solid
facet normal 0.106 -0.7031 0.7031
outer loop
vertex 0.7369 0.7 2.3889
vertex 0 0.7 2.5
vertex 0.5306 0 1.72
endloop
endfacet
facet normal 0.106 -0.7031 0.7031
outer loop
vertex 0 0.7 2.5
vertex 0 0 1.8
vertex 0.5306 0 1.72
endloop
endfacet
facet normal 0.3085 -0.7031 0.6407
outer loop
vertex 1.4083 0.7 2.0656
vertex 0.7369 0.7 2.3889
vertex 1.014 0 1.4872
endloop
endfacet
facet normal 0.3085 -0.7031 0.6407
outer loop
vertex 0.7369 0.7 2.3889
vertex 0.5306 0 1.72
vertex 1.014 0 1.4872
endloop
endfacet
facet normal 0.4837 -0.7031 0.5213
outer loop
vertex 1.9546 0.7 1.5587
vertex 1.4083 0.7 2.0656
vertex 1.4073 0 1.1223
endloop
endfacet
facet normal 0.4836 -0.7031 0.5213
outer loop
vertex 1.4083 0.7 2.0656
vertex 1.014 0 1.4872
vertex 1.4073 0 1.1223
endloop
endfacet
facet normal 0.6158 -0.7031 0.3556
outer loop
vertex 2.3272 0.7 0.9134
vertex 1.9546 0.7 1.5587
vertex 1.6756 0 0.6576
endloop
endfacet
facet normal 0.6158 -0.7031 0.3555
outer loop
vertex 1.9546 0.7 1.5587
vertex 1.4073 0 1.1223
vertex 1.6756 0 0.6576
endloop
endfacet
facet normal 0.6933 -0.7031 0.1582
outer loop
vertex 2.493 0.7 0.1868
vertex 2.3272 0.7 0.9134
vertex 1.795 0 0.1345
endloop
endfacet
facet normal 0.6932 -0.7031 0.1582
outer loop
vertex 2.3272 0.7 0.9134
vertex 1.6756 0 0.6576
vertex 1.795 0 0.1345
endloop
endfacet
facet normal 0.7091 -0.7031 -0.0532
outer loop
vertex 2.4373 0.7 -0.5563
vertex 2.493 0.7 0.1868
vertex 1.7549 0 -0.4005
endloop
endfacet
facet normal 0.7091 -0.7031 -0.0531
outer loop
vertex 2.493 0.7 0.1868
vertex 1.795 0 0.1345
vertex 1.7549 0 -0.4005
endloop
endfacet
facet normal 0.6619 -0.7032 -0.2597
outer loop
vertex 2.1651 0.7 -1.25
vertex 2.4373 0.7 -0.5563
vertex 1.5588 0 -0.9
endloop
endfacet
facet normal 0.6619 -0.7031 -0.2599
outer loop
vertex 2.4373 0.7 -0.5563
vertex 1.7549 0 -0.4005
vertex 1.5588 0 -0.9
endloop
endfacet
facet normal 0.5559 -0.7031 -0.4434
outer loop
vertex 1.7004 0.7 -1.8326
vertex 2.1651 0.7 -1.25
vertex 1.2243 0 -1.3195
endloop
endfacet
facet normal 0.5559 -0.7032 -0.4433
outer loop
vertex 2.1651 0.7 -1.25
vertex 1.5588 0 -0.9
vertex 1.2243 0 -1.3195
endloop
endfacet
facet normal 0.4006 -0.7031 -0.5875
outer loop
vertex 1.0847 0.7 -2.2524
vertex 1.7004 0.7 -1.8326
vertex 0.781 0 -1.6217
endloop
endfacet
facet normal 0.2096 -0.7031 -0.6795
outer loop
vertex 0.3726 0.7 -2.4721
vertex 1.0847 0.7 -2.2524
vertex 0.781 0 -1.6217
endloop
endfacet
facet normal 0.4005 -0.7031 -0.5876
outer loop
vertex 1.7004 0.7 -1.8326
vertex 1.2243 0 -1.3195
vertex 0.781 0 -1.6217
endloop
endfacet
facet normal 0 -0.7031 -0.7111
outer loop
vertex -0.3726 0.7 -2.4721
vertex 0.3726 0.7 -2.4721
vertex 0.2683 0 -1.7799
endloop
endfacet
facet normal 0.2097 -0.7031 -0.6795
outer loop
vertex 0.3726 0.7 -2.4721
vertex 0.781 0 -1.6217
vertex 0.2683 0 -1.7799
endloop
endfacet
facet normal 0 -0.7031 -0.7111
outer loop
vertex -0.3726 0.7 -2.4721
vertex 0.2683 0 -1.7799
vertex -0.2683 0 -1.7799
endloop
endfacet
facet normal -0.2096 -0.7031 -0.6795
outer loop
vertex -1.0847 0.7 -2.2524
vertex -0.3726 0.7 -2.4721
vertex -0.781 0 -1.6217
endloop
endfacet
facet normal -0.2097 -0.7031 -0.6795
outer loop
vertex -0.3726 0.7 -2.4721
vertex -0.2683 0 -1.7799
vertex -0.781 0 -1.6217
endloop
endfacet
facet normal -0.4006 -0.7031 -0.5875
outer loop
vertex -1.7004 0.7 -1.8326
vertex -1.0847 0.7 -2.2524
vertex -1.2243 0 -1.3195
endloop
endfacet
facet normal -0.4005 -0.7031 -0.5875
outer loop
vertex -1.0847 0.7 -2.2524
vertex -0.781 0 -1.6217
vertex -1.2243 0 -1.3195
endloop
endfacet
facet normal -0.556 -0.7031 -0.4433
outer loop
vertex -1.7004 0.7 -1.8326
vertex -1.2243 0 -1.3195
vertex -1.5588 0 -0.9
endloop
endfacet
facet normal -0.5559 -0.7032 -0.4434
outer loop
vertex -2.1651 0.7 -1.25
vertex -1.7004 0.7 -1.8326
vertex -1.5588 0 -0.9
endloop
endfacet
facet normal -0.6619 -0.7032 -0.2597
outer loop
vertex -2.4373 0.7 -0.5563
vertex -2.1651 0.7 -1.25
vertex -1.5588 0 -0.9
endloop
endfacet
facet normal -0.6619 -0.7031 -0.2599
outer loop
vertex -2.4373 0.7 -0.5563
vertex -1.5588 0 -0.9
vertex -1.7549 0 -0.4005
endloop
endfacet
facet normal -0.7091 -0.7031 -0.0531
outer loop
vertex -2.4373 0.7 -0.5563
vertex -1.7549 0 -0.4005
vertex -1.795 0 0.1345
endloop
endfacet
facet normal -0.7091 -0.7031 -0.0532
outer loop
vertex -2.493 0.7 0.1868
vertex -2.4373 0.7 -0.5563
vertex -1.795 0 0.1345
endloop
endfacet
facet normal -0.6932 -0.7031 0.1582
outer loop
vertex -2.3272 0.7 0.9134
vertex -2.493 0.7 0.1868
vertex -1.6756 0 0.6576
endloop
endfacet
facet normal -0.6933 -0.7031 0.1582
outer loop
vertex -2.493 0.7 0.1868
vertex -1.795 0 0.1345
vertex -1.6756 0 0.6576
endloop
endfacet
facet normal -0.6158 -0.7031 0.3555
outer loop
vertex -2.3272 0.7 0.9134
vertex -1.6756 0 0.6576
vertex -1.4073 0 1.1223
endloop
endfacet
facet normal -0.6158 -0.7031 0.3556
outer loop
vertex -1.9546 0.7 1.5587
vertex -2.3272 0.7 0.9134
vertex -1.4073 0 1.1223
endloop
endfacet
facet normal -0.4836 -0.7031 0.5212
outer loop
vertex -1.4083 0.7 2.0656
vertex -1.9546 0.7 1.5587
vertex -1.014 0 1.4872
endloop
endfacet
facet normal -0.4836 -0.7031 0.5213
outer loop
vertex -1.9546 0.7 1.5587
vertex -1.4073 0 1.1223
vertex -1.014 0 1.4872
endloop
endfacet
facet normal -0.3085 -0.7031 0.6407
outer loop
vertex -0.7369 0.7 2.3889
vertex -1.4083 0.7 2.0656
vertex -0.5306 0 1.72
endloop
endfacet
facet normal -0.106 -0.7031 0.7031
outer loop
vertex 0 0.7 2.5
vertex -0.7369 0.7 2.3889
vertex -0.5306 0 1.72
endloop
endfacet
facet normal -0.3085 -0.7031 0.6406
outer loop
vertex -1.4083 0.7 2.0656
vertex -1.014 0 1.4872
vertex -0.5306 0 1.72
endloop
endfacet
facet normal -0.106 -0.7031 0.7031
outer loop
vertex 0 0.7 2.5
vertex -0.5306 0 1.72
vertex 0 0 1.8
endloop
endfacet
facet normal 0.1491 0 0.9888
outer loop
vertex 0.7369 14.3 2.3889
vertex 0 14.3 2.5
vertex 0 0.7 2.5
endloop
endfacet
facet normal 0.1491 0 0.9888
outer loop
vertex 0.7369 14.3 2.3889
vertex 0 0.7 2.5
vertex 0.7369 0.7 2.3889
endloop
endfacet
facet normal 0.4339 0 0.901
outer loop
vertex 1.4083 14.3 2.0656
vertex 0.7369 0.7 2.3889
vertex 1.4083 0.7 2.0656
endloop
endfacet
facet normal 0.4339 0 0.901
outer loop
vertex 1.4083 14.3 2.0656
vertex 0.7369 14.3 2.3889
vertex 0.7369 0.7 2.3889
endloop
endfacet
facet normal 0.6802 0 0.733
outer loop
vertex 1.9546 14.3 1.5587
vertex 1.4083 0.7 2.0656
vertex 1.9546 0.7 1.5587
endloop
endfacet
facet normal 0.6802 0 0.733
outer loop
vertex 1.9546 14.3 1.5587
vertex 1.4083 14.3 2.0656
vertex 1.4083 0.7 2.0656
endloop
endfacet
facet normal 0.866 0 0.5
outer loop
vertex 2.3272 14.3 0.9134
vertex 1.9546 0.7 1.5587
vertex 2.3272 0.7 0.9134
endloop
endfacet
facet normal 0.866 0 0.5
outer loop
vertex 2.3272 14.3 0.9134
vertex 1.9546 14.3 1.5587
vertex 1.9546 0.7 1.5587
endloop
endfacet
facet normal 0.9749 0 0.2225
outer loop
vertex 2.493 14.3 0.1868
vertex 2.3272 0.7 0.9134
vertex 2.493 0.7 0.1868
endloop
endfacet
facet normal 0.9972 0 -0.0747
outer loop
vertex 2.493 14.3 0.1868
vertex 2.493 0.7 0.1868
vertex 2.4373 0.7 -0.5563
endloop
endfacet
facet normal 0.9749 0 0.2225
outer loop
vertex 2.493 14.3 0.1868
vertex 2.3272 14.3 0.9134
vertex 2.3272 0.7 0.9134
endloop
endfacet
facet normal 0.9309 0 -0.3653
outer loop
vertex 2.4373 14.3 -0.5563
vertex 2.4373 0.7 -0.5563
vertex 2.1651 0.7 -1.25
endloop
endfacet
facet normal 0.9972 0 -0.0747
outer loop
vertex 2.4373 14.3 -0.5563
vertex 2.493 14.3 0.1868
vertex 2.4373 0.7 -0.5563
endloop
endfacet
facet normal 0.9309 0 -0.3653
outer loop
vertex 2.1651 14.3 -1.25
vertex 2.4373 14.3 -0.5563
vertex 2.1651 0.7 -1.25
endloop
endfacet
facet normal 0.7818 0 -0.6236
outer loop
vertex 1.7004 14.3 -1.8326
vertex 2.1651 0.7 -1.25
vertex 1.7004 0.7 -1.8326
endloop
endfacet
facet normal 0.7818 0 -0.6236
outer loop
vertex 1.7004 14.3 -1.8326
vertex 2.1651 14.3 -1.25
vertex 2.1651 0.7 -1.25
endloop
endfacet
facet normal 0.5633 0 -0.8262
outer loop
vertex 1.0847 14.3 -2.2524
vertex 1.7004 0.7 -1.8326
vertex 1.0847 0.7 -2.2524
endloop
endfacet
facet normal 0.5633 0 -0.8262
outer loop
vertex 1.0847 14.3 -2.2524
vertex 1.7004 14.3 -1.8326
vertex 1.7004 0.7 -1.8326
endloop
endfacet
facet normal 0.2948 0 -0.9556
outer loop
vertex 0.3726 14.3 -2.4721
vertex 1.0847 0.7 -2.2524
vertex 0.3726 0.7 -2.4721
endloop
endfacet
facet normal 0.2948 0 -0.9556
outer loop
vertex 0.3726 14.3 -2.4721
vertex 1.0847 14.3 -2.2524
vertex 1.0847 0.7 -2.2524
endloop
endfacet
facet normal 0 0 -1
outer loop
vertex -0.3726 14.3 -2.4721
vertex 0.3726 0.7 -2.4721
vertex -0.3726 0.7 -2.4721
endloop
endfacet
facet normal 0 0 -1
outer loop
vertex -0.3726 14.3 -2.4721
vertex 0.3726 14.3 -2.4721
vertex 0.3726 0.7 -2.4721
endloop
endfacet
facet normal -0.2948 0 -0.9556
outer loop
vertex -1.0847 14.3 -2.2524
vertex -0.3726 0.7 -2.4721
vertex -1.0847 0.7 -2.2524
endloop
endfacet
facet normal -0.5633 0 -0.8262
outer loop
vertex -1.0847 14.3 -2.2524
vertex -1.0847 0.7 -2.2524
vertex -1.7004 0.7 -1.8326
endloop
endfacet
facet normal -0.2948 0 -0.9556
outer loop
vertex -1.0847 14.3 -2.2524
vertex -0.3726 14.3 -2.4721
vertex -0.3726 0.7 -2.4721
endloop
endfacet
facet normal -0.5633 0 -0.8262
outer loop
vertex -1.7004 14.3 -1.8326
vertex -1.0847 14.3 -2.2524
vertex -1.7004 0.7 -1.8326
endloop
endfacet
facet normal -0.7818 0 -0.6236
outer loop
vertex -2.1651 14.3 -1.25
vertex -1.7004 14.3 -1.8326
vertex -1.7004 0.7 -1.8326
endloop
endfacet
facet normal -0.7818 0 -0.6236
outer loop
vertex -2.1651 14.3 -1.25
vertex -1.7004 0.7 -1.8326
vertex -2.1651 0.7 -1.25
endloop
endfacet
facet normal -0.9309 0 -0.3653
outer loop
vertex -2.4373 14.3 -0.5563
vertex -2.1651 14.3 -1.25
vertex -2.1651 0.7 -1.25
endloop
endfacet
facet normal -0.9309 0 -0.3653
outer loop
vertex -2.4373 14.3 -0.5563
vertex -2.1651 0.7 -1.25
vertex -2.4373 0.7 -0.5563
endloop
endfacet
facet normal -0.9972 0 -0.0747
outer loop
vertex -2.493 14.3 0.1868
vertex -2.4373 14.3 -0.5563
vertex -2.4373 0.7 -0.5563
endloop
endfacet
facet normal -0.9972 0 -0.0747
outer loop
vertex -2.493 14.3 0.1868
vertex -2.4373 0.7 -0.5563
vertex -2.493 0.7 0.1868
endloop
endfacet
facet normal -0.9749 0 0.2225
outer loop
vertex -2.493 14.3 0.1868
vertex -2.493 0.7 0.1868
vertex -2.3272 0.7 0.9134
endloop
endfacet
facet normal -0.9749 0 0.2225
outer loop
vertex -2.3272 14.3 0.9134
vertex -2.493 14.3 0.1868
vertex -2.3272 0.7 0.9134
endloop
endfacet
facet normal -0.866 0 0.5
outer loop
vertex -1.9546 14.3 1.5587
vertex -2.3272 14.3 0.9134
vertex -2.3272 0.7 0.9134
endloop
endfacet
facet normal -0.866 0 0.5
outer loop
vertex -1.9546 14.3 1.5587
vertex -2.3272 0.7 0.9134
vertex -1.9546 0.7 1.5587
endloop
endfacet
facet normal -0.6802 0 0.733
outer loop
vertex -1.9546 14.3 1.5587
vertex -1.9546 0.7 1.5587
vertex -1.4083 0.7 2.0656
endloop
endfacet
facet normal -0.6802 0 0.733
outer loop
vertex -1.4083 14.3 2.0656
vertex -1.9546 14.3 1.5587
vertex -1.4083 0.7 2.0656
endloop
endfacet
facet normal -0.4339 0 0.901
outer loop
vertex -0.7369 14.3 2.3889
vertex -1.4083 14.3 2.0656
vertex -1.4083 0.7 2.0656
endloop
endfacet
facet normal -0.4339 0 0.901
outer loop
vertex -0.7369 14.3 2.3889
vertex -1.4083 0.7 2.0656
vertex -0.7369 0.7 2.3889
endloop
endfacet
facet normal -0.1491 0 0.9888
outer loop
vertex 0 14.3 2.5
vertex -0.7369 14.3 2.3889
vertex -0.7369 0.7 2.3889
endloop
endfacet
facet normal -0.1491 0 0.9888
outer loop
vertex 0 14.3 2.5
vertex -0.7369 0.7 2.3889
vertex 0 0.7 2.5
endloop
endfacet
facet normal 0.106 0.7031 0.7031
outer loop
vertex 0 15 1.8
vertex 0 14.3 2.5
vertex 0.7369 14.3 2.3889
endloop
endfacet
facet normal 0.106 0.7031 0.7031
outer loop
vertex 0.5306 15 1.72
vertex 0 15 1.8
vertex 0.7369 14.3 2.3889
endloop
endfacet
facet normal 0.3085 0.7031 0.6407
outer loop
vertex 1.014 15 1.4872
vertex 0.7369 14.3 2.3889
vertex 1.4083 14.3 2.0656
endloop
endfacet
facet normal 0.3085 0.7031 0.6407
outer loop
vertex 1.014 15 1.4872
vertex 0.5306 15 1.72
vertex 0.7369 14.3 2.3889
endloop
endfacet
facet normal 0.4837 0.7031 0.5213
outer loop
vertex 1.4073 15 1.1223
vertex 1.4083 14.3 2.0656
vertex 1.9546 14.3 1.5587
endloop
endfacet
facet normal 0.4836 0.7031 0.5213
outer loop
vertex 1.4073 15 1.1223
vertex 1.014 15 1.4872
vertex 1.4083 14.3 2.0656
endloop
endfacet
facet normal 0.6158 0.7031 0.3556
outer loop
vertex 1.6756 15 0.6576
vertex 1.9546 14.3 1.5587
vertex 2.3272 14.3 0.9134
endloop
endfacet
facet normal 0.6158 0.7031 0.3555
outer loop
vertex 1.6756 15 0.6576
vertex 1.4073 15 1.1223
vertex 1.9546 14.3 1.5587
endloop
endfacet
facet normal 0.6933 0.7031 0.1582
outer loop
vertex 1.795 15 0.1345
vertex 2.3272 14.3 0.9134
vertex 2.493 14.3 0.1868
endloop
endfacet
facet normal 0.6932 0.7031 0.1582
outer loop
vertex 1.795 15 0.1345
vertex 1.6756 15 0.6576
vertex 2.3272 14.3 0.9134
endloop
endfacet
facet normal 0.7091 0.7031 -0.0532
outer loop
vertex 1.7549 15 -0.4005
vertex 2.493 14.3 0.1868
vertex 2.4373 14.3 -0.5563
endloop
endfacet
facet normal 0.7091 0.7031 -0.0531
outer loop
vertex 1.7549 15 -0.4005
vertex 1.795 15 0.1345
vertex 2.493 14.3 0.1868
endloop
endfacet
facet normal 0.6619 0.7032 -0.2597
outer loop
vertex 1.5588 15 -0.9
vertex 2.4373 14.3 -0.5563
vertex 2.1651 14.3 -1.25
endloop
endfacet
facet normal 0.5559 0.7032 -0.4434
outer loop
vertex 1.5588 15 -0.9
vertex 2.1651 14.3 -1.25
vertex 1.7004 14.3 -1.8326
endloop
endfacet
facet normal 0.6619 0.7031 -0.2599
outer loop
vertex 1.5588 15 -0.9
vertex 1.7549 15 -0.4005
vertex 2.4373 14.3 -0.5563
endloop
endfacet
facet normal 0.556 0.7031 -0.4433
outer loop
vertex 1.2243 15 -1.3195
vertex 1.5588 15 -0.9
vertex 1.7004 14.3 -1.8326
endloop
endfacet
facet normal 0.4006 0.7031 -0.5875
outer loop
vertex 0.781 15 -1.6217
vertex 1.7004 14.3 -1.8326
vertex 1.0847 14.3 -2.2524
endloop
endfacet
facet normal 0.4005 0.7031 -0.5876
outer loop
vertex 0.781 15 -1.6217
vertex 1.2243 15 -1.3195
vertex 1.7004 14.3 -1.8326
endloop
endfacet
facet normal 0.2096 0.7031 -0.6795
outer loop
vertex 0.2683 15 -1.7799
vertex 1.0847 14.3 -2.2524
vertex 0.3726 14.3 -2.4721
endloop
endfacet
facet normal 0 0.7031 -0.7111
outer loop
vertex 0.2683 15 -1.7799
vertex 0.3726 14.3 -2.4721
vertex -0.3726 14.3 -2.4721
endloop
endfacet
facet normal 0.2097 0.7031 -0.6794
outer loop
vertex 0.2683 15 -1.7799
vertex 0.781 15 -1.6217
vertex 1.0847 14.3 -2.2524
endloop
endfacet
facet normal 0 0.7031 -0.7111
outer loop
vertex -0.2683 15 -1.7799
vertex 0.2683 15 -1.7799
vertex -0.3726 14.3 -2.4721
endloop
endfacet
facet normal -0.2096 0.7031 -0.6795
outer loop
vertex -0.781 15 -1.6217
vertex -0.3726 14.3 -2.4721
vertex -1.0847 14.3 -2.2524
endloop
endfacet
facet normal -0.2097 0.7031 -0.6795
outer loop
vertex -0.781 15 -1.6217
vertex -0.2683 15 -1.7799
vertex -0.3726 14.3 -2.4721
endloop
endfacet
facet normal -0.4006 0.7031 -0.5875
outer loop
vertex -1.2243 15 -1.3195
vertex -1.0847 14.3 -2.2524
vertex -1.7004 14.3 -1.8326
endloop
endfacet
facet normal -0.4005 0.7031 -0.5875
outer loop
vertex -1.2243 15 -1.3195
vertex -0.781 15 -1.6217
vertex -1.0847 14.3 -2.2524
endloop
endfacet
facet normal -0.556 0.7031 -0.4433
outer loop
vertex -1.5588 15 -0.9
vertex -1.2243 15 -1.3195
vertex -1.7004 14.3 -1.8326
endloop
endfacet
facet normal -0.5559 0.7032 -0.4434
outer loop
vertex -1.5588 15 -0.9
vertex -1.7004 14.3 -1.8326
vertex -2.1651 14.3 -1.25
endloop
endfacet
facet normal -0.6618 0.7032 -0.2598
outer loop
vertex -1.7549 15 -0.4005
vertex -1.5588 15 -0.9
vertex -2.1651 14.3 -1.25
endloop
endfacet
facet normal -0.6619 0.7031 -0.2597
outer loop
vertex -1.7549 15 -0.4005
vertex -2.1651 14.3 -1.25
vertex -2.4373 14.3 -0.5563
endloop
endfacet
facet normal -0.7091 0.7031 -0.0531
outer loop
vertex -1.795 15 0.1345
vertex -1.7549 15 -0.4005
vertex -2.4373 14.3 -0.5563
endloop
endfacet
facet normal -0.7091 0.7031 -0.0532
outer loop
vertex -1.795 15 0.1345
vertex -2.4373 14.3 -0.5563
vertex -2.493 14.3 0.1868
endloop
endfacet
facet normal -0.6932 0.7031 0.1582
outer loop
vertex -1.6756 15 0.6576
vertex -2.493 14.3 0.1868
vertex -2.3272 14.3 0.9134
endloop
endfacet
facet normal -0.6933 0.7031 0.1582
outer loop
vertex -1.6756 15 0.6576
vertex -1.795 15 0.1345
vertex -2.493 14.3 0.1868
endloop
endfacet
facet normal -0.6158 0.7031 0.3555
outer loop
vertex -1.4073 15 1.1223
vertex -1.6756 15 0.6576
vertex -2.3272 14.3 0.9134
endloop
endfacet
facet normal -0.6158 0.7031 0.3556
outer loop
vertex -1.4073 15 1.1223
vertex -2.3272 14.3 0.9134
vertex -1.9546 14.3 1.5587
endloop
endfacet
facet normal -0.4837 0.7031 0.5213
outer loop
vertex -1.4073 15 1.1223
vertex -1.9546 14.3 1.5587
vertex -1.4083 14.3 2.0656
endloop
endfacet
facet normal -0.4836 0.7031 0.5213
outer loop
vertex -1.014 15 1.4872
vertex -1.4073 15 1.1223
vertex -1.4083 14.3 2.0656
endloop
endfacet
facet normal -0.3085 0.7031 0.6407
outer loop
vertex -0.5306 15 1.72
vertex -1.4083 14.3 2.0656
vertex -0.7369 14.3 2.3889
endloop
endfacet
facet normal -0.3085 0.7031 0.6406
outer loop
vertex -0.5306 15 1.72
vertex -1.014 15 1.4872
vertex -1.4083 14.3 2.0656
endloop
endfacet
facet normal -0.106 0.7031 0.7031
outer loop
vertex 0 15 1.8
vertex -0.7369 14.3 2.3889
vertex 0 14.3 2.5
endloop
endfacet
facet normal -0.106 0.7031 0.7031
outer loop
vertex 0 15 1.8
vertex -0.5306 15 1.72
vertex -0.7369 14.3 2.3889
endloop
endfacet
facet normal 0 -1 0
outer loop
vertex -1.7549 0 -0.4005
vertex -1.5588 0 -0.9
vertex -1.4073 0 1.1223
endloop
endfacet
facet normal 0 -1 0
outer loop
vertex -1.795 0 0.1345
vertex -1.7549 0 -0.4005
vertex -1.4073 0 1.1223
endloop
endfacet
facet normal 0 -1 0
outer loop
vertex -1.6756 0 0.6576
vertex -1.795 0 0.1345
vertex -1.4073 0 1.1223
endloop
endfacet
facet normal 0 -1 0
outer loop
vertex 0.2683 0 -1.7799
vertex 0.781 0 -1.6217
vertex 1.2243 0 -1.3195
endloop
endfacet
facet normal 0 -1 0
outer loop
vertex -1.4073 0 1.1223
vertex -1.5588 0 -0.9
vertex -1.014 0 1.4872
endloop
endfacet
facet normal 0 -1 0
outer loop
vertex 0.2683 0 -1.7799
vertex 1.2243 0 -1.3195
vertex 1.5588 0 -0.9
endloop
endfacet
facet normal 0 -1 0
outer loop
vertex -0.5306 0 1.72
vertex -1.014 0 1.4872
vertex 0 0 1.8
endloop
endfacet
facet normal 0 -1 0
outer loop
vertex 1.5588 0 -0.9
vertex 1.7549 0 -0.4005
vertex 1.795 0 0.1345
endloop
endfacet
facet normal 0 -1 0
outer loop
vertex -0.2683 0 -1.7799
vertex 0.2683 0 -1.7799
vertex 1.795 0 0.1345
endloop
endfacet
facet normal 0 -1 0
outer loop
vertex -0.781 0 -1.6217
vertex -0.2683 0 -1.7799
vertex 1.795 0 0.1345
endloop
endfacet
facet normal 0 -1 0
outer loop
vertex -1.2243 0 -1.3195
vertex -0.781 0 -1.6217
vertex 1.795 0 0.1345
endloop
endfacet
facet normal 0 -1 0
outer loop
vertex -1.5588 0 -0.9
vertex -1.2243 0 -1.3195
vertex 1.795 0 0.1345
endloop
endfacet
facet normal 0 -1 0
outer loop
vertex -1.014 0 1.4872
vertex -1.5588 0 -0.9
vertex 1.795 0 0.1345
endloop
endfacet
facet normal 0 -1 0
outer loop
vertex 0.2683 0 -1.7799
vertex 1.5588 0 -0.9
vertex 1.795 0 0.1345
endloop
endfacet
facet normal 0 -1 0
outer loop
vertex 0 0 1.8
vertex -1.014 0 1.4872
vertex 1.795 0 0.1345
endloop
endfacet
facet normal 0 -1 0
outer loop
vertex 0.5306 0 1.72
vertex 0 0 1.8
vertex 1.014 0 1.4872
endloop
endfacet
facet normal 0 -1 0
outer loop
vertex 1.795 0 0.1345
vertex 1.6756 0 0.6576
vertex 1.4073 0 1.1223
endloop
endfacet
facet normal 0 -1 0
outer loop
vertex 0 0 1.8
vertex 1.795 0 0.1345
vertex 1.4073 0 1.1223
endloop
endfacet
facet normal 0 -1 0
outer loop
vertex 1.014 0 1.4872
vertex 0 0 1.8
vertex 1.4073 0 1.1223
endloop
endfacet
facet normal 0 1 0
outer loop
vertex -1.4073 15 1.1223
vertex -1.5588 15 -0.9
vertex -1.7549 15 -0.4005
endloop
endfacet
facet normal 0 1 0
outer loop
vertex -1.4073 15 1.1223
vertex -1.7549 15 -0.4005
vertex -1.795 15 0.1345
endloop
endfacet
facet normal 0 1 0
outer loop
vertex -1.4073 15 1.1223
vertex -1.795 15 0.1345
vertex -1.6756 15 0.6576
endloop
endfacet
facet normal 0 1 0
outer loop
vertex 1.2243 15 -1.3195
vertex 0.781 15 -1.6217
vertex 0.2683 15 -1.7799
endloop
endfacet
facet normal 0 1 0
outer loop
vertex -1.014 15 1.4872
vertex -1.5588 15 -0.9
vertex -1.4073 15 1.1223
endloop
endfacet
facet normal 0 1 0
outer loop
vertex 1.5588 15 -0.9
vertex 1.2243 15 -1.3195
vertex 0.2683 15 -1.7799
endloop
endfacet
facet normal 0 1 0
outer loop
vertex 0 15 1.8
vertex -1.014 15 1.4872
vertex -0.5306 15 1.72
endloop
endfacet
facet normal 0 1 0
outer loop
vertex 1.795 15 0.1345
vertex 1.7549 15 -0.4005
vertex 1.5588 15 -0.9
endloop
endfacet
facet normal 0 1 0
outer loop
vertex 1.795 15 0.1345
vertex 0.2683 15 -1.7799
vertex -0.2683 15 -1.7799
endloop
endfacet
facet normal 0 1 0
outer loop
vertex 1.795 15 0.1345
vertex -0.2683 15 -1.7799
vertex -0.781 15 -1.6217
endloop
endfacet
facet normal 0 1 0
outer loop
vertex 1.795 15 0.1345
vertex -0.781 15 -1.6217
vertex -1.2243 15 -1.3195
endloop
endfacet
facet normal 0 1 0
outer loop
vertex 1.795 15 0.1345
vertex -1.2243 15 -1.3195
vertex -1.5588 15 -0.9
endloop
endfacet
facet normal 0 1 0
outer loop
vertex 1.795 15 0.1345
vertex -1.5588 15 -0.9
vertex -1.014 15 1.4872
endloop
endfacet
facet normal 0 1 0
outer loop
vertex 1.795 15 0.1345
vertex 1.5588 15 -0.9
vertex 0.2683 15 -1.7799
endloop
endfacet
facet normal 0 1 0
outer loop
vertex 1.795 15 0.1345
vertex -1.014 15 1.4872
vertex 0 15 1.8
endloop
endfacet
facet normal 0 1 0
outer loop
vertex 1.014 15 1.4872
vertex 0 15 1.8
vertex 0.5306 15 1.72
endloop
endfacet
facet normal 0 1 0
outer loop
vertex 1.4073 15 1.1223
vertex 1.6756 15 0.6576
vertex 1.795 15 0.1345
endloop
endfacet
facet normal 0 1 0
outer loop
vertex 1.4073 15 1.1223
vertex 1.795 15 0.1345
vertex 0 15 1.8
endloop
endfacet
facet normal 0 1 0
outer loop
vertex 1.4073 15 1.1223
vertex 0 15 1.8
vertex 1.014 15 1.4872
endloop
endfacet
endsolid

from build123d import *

# Parameters (mm, degrees)
SKETCH1_R           = 2.6
BOSS_EXTRUDE1_DEPTH = 15
CHAMFER1_SIZE       = 0.8
SKETCH2_R           = 2.6
SKETCH2_R_2         = 2.5
CUT_EXTRUDE2_DEPTH  = 16.444092722


with BuildPart() as part:
    # Sketch1 → Boss-Extrude1 (new body)
    with BuildSketch(Plane(origin=(0, 0, 0), x_dir=(1, 0, 0), z_dir=(0, 1, 0))):
        with Locations(Location((0, 0, 0), (0, 0, 270))):
            Circle(SKETCH1_R)
    extrude(amount=BOSS_EXTRUDE1_DEPTH)

    # Chamfer1
    chamfer1_edges = [part.edges().sort_by_distance(p)[0] for p in [
        (0, 0, -2.6),
        (0, 15, -2.6),
    ]]
    chamfer(chamfer1_edges, length=CHAMFER1_SIZE)

    # Sketch2 → Cut-Extrude2 (cut, through all)
    with BuildSketch(Plane(origin=(0, 15, 0), x_dir=(1, 0, 0), z_dir=(0, 1, 0))):
        Circle(SKETCH2_R)
        with Locations(Location((0, 0, 0), (0, 0, 270))):
            Circle(SKETCH2_R_2, mode=Mode.SUBTRACT)
    extrude(amount=-CUT_EXTRUDE2_DEPTH, mode=Mode.SUBTRACT)


solid = part.part
